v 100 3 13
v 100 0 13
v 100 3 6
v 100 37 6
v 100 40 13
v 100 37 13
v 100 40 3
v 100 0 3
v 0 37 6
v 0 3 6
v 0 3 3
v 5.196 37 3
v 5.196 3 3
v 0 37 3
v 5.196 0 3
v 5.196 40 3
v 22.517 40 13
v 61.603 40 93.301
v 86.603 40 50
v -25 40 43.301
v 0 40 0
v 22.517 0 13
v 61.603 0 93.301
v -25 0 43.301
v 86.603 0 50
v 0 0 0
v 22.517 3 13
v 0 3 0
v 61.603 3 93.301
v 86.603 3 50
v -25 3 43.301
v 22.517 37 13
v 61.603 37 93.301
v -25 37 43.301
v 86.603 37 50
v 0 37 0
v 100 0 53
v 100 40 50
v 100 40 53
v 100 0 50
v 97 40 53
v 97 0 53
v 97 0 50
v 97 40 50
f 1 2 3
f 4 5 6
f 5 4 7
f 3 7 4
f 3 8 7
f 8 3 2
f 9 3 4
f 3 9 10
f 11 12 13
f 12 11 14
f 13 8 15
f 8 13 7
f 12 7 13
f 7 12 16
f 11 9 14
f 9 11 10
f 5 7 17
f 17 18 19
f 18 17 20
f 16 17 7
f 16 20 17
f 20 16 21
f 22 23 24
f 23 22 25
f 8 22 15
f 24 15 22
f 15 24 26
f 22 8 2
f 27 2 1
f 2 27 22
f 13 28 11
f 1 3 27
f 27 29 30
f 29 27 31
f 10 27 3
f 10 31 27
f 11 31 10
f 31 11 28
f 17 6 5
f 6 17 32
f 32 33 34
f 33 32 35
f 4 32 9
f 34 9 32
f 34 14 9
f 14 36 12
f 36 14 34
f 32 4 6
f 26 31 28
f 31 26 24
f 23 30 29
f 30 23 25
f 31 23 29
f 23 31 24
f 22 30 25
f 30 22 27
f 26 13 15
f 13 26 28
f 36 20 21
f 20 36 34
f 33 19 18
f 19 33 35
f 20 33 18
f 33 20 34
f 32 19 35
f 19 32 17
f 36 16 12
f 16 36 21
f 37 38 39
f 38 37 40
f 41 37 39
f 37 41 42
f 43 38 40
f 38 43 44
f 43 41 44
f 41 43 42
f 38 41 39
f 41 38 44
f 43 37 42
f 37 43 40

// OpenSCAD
// OpenSCAD script to create a simple slide

// Parameters
slide_length = 100;  // Length of the sliding surface
slide_width = 40;    // Width of the slide
slide_height = 50;   // Height of the top platform
side_wall_height = 10;
thickness = 3;       // Thickness of the material

module slide() {
    // Sliding surface
    translate([0, 0, thickness])
    cube([slide_length, slide_width, thickness]);
    
    // Side walls
    translate([0, 0, thickness])
    cube([slide_length, thickness, side_wall_height]);
    
    translate([0, slide_width - thickness, thickness])
    cube([slide_length, thickness, side_wall_height]);
    
    // Support structure
    translate([0, 0, 0])
    rotate([0, -30, 0])
    cube([slide_length, thickness, slide_height]);
    
    translate([0, slide_width - thickness, 0])
    rotate([0, -30, 0])
    cube([slide_length, thickness, slide_height]);
    
    // Top platform
    translate([slide_length - thickness, 0, slide_height])
    cube([thickness, slide_width, thickness]);
}

slide();
